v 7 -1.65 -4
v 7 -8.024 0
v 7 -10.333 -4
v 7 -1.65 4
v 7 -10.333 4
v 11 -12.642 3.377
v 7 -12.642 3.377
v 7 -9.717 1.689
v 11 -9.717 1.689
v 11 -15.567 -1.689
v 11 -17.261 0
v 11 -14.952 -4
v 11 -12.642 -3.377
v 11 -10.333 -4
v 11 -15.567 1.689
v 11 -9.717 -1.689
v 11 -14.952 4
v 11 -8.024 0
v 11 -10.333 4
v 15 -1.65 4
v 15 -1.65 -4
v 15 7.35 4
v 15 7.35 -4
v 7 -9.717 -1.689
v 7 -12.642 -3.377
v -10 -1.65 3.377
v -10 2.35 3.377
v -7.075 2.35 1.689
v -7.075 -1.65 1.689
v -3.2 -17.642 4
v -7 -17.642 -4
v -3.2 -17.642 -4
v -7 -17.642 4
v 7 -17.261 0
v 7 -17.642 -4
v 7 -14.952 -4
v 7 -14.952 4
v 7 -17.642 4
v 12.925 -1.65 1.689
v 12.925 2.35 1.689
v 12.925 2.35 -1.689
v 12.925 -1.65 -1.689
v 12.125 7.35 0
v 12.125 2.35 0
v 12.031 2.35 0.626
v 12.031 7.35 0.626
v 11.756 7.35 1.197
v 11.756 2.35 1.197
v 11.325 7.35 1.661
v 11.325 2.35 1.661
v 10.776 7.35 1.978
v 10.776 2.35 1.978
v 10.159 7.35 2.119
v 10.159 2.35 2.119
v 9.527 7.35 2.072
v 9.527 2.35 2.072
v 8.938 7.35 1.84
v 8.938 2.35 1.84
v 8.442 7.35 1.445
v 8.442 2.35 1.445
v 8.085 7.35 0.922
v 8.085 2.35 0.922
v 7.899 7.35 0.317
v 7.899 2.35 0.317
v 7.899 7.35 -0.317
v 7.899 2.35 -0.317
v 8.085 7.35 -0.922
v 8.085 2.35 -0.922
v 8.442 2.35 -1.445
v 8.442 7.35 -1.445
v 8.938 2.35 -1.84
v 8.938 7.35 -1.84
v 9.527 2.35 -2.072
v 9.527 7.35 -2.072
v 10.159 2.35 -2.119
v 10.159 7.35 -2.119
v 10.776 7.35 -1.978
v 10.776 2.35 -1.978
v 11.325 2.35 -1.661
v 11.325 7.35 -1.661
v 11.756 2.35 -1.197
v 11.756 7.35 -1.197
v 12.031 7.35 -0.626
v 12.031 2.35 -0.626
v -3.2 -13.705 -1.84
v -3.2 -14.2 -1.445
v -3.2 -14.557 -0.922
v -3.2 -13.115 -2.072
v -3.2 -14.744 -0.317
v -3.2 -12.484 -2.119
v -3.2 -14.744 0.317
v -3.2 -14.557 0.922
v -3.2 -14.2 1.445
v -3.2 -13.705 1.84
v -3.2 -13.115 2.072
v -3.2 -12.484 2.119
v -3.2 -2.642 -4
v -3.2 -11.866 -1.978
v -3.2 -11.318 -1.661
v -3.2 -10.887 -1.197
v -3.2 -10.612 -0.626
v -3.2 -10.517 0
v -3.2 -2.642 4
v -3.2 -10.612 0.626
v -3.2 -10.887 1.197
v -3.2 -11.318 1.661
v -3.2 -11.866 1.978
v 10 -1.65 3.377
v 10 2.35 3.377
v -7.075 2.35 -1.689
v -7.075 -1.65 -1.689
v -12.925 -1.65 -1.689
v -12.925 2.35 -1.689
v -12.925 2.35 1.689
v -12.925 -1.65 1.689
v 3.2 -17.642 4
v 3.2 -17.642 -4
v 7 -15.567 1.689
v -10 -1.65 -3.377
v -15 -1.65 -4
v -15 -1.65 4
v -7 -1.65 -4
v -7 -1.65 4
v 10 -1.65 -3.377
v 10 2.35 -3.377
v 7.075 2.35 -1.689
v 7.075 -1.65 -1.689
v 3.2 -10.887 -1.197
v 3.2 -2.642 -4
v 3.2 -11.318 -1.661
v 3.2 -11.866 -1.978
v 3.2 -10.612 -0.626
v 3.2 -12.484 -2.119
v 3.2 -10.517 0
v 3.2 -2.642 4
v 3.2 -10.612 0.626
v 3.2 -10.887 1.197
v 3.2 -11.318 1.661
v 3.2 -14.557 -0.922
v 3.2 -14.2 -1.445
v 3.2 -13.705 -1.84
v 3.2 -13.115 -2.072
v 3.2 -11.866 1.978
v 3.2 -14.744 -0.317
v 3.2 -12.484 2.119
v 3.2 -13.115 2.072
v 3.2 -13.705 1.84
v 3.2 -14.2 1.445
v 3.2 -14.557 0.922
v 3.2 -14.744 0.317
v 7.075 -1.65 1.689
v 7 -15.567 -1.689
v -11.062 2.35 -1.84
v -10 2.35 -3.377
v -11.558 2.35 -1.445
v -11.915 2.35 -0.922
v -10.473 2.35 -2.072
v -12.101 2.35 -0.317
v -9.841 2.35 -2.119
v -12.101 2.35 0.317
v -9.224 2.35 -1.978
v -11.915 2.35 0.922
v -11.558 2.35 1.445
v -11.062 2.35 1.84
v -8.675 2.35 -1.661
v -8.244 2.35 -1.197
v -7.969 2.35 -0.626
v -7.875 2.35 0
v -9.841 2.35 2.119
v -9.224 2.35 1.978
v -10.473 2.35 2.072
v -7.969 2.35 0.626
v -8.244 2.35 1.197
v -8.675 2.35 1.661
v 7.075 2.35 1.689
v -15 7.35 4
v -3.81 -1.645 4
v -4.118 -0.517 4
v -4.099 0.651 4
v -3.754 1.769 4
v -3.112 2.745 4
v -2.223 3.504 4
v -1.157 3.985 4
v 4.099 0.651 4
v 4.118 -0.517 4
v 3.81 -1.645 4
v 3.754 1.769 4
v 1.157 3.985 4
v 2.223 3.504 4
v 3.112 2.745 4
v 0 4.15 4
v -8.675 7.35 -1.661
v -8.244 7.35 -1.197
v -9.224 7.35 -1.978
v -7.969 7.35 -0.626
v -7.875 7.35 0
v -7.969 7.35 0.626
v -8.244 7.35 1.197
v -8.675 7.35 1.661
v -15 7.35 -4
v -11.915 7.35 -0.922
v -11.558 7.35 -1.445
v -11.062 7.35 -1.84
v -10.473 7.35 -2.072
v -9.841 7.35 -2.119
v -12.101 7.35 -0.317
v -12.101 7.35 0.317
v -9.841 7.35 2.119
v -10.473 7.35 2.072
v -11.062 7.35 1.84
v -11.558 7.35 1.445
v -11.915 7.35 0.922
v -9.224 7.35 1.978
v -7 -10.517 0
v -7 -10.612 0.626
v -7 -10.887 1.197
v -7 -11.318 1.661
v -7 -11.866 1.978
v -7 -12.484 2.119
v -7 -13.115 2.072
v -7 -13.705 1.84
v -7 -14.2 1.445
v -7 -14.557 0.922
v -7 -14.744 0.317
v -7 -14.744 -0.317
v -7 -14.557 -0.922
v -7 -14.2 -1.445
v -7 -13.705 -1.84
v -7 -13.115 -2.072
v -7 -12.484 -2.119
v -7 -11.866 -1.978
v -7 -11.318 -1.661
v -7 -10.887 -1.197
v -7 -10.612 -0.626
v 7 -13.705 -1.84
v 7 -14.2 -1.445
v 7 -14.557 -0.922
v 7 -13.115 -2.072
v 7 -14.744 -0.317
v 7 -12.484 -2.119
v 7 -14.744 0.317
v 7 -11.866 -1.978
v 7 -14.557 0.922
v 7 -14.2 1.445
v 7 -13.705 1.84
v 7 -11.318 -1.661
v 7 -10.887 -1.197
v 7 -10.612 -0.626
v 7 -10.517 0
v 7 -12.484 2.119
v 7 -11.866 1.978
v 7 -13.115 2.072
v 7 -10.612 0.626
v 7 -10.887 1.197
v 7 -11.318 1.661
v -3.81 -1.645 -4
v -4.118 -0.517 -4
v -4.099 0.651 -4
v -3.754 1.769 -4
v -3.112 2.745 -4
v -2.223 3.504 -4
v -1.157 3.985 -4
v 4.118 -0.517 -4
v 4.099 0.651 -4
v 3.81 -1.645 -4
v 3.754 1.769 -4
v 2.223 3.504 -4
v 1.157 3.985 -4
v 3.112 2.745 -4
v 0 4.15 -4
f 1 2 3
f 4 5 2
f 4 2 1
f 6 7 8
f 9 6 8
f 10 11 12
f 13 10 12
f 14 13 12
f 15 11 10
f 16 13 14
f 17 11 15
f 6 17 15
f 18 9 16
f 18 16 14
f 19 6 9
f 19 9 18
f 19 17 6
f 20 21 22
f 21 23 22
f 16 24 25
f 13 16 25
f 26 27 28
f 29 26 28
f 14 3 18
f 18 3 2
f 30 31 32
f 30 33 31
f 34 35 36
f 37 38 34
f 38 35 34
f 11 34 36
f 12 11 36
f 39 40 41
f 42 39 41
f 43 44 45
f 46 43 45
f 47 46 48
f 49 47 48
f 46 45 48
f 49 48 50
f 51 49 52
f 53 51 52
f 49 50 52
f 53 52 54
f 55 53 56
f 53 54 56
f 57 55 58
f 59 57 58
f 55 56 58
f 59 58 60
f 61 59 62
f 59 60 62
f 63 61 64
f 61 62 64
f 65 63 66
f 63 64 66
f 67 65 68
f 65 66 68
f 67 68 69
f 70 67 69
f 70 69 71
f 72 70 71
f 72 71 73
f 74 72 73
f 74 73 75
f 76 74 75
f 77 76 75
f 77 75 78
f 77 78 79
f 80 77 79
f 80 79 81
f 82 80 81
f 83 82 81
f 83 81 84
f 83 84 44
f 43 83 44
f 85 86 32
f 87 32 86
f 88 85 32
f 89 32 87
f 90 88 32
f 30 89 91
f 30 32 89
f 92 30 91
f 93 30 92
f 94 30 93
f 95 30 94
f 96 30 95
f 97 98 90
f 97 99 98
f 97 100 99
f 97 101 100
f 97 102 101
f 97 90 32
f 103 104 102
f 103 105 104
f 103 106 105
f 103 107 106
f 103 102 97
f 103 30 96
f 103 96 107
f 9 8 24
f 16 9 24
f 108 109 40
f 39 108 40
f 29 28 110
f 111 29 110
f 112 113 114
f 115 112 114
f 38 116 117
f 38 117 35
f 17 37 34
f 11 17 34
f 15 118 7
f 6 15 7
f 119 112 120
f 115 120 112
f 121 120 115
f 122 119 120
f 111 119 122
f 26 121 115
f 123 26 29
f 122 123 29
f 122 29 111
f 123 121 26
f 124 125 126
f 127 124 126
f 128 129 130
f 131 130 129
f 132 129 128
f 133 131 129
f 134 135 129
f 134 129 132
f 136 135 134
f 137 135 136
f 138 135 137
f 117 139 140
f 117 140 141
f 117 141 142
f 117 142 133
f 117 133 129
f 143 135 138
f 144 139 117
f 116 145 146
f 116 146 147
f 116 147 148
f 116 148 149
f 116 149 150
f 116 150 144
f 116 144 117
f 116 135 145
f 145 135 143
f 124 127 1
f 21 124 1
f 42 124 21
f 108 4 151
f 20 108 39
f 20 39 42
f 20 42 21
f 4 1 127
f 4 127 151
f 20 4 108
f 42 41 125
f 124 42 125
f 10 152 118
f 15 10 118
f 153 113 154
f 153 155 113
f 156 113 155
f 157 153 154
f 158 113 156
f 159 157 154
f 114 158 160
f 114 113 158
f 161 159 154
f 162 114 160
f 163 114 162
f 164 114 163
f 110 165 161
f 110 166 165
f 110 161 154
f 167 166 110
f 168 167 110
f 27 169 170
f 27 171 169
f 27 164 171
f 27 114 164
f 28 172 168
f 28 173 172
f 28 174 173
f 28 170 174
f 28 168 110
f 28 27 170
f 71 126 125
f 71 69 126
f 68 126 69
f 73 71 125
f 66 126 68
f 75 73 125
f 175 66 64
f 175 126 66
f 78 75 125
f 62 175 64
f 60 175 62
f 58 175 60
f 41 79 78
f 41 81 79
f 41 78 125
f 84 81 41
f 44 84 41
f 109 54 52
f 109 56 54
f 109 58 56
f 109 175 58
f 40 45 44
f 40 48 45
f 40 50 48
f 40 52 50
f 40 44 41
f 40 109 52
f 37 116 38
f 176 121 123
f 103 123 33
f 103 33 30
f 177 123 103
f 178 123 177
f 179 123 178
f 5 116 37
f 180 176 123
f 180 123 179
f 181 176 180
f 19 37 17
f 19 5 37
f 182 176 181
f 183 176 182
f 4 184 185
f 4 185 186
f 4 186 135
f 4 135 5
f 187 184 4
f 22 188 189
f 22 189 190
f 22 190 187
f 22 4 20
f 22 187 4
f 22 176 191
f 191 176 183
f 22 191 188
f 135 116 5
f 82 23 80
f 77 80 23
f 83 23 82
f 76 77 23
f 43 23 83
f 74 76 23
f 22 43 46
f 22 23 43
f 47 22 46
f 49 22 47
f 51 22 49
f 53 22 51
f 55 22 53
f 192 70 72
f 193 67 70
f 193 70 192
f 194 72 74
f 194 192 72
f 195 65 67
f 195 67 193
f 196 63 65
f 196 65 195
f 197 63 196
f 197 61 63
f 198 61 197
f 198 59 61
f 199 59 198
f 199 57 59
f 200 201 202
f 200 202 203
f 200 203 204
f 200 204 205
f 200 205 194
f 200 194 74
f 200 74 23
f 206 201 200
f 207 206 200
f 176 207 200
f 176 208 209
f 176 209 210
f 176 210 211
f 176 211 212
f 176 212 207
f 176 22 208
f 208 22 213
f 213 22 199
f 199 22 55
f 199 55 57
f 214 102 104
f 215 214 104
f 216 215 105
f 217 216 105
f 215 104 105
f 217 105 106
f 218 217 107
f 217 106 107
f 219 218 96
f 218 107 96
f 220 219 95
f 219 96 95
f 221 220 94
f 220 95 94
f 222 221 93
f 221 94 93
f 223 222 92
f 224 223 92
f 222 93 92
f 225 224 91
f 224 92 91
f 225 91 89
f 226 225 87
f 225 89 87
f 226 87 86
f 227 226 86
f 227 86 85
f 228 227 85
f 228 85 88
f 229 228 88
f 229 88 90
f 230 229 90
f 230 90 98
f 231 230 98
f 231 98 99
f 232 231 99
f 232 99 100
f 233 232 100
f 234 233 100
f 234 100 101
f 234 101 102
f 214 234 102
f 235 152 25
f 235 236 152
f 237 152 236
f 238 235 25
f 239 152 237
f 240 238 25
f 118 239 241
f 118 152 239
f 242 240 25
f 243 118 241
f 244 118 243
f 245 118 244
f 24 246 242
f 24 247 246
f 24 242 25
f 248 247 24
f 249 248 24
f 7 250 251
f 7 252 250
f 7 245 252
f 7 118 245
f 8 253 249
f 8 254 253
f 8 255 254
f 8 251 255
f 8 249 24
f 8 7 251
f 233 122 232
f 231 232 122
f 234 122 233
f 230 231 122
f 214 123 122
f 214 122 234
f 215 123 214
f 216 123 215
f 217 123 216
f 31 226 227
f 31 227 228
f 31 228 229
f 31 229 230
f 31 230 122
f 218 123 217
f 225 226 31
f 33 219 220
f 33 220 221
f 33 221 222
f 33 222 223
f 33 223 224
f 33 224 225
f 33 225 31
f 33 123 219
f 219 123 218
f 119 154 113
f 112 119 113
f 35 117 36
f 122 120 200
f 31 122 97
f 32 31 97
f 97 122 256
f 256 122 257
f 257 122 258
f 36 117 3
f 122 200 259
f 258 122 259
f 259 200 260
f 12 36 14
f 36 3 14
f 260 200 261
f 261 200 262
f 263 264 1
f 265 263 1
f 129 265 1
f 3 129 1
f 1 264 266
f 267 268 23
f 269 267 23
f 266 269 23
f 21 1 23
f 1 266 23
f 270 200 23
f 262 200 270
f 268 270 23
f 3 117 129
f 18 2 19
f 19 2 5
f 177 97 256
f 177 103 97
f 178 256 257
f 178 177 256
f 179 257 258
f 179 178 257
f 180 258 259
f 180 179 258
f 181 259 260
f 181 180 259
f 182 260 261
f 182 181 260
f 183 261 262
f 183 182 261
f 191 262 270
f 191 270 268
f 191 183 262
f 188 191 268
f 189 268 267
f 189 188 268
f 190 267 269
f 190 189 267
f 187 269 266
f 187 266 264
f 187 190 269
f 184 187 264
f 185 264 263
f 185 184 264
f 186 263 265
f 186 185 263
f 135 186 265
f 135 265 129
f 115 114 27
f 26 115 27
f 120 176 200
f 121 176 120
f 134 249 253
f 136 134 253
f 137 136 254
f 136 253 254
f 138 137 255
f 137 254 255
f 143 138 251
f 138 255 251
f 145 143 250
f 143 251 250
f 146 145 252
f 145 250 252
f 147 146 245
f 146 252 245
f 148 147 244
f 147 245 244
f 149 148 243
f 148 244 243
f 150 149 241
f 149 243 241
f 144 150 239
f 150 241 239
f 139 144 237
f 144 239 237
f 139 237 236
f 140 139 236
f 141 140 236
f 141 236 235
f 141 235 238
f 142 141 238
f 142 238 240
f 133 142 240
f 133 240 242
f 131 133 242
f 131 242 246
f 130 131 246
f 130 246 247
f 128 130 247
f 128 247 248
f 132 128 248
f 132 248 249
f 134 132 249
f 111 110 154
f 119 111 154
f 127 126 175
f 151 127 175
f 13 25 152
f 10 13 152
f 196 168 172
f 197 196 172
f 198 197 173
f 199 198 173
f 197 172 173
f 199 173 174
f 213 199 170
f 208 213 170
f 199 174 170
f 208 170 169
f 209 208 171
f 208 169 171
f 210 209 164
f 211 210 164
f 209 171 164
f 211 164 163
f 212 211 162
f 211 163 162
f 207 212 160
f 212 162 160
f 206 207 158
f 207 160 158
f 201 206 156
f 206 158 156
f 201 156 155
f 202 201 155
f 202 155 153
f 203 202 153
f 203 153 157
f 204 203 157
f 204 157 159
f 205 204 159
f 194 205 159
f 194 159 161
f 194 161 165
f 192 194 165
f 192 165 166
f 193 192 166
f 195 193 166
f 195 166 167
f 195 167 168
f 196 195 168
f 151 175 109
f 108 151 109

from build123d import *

# Parameters (mm, degrees)
F1_DEPTH = 4
F2_R     = 2.125
F3_DEPTH = 5.001
F4_W     = 8
F4_H     = 8
F5_DEPTH = 4
F6_R     = 2.125
F7_DEPTH = 22.001
F9_DEPTH = 4


with BuildPart() as f1:
    # F0 (on Top) → F1 (new body, symmetric)
    with BuildSketch(Plane.XY):
        with BuildLine():
            ThreePointArc((-3.2, -2.642442), (0, 4.15), (3.2, -2.642442))
            Line((3.2, -2.642442), (3.2, -17.642442))
            Line((3.2, -17.642442), (7, -17.642442))
            Line((7, -17.642442), (7, 2.35))
            Line((7, 2.35), (15, 2.35))
            Line((15, 2.35), (15, 7.35))
            Line((15, 7.35), (-15, 7.35))
            Line((-15, 7.35), (-15, 2.35))
            Line((-15, 2.35), (-7, 2.35))
            Line((-7, 2.35), (-7, -17.642442))
            Line((-7, -17.642442), (-3.2, -17.642442))
            Line((-3.2, -17.642442), (-3.2, -2.642442))
        make_face()
    extrude(amount=F1_DEPTH, both=True)

    # F2 (on face) → F3 (cut, through all)
    with BuildSketch(Plane.XZ.offset(-2.35)):
        with Locations((10, 0)):
            Circle(F2_R)
        with Locations((-10, 0)):
            Circle(F2_R)
    extrude(amount=-F3_DEPTH, mode=Mode.SUBTRACT)

    # F4 (on face) → F5 (join)
    with BuildSketch(Plane.XZ.offset(-2.35)):
        with Locations((11, 0)):
            Rectangle(F4_W, F4_H)
        Polygon((10, 3.377499), (12.925, 1.68875), (12.925, -1.68875), (10, -3.377499), (7.075, -1.68875), (7.075, 1.68875), align=None, mode=Mode.SUBTRACT)
        with Locations((-11, 0)):
            Rectangle(F4_W, F4_H)
        Polygon((-7.075, 1.68875), (-7.075, -1.68875), (-10, -3.377499), (-12.925, -1.68875), (-12.925, 1.68875), (-10, 3.377499), align=None, mode=Mode.SUBTRACT)
    extrude(amount=F5_DEPTH)

    # F6 (on face) → F7 (cut, through all)
    with BuildSketch(Plane.YZ.offset(7)):
        with Locations((-12.642442, 0)):
            Circle(F6_R)
    extrude(amount=-F7_DEPTH, mode=Mode.SUBTRACT)

    # F8 (on face) → F9 (join)
    with BuildSketch(Plane.YZ.offset(7)):
        Polygon((-14.951843, -4), (-10.333041, -4), (-8.02364, 0), (-10.333041, 4), (-14.951843, 4), (-17.261244, 0), align=None)
        Polygon((-12.642442, 3.377499), (-9.717442, 1.68875), (-9.717442, -1.68875), (-12.642442, -3.377499), (-15.567442, -1.68875), (-15.567442, 1.68875), align=None, mode=Mode.SUBTRACT)
    extrude(amount=F9_DEPTH)


solid = f1.part
